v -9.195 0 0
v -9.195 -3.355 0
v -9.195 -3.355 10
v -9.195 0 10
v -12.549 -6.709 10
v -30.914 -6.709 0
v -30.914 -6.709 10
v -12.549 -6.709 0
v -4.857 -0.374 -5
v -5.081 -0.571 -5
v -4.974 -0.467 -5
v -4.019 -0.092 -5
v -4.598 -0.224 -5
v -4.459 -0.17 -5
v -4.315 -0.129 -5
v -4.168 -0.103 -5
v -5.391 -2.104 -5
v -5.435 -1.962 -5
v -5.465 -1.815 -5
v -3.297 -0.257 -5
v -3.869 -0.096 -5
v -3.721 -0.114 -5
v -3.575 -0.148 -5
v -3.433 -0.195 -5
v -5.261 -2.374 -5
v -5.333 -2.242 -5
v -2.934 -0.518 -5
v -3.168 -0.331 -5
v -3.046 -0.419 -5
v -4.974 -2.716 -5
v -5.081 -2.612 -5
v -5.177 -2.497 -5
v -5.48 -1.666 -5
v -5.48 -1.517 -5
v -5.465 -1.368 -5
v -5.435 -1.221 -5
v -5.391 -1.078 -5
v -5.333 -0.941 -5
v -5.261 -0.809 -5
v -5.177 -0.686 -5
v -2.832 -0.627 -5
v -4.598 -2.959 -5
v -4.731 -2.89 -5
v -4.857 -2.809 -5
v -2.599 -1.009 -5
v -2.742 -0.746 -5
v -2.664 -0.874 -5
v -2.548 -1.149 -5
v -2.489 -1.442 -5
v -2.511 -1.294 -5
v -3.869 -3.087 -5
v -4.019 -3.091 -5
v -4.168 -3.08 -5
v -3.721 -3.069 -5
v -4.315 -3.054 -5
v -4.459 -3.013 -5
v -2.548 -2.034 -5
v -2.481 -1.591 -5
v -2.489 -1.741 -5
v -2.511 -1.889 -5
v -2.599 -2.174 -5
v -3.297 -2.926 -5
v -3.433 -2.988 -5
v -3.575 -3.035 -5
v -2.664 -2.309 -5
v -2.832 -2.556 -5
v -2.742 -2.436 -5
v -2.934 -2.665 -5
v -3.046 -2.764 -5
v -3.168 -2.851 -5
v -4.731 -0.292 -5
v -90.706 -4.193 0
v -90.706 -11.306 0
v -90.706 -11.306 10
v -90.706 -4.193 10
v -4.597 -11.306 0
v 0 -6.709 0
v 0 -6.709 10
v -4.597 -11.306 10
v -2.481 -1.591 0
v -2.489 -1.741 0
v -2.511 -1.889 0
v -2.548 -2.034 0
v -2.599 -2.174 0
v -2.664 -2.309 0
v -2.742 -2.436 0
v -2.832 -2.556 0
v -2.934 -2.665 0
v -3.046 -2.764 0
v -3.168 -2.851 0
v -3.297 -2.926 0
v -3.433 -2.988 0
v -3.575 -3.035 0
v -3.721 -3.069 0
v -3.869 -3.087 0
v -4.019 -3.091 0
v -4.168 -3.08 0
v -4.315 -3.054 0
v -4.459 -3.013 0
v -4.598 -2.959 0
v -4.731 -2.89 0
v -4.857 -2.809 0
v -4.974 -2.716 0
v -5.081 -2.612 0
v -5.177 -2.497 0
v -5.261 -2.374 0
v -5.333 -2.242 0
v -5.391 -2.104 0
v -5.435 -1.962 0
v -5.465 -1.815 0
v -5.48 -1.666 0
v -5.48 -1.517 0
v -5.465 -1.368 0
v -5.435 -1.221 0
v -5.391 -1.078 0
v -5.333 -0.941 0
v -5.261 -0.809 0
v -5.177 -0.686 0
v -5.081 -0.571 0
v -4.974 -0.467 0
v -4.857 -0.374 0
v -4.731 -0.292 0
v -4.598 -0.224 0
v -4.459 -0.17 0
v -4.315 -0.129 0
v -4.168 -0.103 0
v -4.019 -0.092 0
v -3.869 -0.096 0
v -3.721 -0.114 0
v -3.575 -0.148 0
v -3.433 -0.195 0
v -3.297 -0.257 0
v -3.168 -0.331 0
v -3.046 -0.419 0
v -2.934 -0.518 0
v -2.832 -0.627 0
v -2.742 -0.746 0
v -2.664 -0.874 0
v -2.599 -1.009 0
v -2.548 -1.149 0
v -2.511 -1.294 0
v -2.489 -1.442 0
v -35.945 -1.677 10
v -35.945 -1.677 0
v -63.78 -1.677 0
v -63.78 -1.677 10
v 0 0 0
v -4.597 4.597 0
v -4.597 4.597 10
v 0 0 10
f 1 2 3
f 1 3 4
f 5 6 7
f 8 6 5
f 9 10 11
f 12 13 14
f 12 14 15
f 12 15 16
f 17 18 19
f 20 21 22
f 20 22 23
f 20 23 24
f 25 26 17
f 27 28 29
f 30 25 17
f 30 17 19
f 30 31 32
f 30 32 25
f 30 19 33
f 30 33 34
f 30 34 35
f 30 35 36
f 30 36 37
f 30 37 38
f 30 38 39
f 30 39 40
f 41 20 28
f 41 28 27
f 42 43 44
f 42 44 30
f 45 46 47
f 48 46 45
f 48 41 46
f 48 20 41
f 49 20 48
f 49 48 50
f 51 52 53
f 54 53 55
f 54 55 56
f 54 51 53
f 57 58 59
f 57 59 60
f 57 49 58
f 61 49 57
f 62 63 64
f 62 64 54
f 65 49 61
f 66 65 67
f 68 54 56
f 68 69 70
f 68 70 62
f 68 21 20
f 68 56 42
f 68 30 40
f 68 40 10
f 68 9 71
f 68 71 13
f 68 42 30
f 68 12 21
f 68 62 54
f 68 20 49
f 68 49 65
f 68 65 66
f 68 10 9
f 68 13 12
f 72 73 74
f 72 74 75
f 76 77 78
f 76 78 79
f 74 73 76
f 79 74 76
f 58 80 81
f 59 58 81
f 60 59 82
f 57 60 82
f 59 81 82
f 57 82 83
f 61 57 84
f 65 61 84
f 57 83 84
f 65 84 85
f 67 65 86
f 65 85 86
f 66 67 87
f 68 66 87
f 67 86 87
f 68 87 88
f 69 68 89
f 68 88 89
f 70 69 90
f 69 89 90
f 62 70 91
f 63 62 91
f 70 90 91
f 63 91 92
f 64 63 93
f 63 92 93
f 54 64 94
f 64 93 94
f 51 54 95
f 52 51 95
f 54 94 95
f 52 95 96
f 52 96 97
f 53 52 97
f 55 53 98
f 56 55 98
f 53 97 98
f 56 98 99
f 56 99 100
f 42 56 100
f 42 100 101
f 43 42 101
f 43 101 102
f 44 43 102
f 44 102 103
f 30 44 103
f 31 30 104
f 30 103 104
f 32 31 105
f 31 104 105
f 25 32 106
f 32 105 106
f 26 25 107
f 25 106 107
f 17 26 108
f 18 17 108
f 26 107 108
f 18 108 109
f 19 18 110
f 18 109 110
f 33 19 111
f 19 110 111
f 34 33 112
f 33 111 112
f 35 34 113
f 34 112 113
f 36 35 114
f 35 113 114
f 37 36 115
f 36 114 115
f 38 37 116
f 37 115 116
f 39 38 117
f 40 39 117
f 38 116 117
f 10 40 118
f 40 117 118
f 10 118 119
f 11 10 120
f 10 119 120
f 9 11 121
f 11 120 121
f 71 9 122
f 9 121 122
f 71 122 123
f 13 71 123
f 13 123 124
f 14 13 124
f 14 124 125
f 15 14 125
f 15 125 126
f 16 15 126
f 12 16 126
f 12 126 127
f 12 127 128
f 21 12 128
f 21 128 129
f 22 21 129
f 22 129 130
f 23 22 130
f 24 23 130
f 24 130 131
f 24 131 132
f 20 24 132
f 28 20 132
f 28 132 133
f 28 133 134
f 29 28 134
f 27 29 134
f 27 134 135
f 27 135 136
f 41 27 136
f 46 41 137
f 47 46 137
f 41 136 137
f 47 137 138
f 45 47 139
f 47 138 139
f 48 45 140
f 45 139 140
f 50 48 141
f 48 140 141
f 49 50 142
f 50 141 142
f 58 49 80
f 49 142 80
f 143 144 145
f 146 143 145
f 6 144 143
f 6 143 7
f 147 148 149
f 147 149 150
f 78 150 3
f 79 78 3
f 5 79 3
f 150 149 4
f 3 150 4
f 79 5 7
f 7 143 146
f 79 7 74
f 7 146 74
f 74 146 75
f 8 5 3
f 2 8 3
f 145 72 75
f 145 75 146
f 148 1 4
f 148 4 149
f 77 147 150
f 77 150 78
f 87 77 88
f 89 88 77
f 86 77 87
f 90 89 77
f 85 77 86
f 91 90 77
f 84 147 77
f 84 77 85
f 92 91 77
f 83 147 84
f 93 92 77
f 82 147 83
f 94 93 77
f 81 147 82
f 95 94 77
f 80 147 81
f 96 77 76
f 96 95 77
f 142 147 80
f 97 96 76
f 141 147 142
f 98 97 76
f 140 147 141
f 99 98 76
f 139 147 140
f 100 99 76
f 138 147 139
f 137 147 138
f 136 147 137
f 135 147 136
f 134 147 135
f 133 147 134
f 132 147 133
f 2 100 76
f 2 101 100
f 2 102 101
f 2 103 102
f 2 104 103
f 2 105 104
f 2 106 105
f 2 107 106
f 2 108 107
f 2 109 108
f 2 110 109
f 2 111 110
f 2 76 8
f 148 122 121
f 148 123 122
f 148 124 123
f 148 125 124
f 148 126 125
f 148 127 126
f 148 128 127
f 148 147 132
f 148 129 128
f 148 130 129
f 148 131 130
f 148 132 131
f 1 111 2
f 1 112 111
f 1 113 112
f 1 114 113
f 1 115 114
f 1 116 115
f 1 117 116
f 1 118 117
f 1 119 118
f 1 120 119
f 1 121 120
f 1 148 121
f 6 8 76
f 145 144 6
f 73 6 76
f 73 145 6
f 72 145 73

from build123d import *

# Parameters (mm, degrees)
BOSS_EXTRUDE1_DEPTH = 10
SKETCH2_R           = 1.5
BOSS_EXTRUDE2_DEPTH = 5


with BuildPart() as part:
    # Sketch1 → Boss-Extrude1 (new body)
    with BuildSketch(Plane.XY):
        Polygon((0, 0), (0, -6.709191333), (-4.597281239, -11.306472572), (-57.229872555, -11.306472572), (-83.792838338, -11.306472572), (-90.706486966, -11.306472572), (-90.706486966, -4.193244583), (-63.77964494, -1.677297833), (-49.58847144, -1.677297833), (-35.945470397, -1.677297833), (-30.913576897, -6.709191333), (-12.549158145, -6.709191333), (-9.194562479, -3.354595666), (-9.194562479, 0), (-4.597281239, 4.597281239), align=None)
    extrude(amount=BOSS_EXTRUDE1_DEPTH)

    # Sketch2 → Boss-Extrude2 (add)
    with BuildSketch(Plane(origin=(0, 0, 0), x_dir=(-1, 0, 0), z_dir=(0, 0, -1))):
        with Locations(Location((3.981479871, -1.591444595, 0), (0, 0, 180))):
            Circle(SKETCH2_R)
    extrude(amount=BOSS_EXTRUDE2_DEPTH)


solid = part.part
